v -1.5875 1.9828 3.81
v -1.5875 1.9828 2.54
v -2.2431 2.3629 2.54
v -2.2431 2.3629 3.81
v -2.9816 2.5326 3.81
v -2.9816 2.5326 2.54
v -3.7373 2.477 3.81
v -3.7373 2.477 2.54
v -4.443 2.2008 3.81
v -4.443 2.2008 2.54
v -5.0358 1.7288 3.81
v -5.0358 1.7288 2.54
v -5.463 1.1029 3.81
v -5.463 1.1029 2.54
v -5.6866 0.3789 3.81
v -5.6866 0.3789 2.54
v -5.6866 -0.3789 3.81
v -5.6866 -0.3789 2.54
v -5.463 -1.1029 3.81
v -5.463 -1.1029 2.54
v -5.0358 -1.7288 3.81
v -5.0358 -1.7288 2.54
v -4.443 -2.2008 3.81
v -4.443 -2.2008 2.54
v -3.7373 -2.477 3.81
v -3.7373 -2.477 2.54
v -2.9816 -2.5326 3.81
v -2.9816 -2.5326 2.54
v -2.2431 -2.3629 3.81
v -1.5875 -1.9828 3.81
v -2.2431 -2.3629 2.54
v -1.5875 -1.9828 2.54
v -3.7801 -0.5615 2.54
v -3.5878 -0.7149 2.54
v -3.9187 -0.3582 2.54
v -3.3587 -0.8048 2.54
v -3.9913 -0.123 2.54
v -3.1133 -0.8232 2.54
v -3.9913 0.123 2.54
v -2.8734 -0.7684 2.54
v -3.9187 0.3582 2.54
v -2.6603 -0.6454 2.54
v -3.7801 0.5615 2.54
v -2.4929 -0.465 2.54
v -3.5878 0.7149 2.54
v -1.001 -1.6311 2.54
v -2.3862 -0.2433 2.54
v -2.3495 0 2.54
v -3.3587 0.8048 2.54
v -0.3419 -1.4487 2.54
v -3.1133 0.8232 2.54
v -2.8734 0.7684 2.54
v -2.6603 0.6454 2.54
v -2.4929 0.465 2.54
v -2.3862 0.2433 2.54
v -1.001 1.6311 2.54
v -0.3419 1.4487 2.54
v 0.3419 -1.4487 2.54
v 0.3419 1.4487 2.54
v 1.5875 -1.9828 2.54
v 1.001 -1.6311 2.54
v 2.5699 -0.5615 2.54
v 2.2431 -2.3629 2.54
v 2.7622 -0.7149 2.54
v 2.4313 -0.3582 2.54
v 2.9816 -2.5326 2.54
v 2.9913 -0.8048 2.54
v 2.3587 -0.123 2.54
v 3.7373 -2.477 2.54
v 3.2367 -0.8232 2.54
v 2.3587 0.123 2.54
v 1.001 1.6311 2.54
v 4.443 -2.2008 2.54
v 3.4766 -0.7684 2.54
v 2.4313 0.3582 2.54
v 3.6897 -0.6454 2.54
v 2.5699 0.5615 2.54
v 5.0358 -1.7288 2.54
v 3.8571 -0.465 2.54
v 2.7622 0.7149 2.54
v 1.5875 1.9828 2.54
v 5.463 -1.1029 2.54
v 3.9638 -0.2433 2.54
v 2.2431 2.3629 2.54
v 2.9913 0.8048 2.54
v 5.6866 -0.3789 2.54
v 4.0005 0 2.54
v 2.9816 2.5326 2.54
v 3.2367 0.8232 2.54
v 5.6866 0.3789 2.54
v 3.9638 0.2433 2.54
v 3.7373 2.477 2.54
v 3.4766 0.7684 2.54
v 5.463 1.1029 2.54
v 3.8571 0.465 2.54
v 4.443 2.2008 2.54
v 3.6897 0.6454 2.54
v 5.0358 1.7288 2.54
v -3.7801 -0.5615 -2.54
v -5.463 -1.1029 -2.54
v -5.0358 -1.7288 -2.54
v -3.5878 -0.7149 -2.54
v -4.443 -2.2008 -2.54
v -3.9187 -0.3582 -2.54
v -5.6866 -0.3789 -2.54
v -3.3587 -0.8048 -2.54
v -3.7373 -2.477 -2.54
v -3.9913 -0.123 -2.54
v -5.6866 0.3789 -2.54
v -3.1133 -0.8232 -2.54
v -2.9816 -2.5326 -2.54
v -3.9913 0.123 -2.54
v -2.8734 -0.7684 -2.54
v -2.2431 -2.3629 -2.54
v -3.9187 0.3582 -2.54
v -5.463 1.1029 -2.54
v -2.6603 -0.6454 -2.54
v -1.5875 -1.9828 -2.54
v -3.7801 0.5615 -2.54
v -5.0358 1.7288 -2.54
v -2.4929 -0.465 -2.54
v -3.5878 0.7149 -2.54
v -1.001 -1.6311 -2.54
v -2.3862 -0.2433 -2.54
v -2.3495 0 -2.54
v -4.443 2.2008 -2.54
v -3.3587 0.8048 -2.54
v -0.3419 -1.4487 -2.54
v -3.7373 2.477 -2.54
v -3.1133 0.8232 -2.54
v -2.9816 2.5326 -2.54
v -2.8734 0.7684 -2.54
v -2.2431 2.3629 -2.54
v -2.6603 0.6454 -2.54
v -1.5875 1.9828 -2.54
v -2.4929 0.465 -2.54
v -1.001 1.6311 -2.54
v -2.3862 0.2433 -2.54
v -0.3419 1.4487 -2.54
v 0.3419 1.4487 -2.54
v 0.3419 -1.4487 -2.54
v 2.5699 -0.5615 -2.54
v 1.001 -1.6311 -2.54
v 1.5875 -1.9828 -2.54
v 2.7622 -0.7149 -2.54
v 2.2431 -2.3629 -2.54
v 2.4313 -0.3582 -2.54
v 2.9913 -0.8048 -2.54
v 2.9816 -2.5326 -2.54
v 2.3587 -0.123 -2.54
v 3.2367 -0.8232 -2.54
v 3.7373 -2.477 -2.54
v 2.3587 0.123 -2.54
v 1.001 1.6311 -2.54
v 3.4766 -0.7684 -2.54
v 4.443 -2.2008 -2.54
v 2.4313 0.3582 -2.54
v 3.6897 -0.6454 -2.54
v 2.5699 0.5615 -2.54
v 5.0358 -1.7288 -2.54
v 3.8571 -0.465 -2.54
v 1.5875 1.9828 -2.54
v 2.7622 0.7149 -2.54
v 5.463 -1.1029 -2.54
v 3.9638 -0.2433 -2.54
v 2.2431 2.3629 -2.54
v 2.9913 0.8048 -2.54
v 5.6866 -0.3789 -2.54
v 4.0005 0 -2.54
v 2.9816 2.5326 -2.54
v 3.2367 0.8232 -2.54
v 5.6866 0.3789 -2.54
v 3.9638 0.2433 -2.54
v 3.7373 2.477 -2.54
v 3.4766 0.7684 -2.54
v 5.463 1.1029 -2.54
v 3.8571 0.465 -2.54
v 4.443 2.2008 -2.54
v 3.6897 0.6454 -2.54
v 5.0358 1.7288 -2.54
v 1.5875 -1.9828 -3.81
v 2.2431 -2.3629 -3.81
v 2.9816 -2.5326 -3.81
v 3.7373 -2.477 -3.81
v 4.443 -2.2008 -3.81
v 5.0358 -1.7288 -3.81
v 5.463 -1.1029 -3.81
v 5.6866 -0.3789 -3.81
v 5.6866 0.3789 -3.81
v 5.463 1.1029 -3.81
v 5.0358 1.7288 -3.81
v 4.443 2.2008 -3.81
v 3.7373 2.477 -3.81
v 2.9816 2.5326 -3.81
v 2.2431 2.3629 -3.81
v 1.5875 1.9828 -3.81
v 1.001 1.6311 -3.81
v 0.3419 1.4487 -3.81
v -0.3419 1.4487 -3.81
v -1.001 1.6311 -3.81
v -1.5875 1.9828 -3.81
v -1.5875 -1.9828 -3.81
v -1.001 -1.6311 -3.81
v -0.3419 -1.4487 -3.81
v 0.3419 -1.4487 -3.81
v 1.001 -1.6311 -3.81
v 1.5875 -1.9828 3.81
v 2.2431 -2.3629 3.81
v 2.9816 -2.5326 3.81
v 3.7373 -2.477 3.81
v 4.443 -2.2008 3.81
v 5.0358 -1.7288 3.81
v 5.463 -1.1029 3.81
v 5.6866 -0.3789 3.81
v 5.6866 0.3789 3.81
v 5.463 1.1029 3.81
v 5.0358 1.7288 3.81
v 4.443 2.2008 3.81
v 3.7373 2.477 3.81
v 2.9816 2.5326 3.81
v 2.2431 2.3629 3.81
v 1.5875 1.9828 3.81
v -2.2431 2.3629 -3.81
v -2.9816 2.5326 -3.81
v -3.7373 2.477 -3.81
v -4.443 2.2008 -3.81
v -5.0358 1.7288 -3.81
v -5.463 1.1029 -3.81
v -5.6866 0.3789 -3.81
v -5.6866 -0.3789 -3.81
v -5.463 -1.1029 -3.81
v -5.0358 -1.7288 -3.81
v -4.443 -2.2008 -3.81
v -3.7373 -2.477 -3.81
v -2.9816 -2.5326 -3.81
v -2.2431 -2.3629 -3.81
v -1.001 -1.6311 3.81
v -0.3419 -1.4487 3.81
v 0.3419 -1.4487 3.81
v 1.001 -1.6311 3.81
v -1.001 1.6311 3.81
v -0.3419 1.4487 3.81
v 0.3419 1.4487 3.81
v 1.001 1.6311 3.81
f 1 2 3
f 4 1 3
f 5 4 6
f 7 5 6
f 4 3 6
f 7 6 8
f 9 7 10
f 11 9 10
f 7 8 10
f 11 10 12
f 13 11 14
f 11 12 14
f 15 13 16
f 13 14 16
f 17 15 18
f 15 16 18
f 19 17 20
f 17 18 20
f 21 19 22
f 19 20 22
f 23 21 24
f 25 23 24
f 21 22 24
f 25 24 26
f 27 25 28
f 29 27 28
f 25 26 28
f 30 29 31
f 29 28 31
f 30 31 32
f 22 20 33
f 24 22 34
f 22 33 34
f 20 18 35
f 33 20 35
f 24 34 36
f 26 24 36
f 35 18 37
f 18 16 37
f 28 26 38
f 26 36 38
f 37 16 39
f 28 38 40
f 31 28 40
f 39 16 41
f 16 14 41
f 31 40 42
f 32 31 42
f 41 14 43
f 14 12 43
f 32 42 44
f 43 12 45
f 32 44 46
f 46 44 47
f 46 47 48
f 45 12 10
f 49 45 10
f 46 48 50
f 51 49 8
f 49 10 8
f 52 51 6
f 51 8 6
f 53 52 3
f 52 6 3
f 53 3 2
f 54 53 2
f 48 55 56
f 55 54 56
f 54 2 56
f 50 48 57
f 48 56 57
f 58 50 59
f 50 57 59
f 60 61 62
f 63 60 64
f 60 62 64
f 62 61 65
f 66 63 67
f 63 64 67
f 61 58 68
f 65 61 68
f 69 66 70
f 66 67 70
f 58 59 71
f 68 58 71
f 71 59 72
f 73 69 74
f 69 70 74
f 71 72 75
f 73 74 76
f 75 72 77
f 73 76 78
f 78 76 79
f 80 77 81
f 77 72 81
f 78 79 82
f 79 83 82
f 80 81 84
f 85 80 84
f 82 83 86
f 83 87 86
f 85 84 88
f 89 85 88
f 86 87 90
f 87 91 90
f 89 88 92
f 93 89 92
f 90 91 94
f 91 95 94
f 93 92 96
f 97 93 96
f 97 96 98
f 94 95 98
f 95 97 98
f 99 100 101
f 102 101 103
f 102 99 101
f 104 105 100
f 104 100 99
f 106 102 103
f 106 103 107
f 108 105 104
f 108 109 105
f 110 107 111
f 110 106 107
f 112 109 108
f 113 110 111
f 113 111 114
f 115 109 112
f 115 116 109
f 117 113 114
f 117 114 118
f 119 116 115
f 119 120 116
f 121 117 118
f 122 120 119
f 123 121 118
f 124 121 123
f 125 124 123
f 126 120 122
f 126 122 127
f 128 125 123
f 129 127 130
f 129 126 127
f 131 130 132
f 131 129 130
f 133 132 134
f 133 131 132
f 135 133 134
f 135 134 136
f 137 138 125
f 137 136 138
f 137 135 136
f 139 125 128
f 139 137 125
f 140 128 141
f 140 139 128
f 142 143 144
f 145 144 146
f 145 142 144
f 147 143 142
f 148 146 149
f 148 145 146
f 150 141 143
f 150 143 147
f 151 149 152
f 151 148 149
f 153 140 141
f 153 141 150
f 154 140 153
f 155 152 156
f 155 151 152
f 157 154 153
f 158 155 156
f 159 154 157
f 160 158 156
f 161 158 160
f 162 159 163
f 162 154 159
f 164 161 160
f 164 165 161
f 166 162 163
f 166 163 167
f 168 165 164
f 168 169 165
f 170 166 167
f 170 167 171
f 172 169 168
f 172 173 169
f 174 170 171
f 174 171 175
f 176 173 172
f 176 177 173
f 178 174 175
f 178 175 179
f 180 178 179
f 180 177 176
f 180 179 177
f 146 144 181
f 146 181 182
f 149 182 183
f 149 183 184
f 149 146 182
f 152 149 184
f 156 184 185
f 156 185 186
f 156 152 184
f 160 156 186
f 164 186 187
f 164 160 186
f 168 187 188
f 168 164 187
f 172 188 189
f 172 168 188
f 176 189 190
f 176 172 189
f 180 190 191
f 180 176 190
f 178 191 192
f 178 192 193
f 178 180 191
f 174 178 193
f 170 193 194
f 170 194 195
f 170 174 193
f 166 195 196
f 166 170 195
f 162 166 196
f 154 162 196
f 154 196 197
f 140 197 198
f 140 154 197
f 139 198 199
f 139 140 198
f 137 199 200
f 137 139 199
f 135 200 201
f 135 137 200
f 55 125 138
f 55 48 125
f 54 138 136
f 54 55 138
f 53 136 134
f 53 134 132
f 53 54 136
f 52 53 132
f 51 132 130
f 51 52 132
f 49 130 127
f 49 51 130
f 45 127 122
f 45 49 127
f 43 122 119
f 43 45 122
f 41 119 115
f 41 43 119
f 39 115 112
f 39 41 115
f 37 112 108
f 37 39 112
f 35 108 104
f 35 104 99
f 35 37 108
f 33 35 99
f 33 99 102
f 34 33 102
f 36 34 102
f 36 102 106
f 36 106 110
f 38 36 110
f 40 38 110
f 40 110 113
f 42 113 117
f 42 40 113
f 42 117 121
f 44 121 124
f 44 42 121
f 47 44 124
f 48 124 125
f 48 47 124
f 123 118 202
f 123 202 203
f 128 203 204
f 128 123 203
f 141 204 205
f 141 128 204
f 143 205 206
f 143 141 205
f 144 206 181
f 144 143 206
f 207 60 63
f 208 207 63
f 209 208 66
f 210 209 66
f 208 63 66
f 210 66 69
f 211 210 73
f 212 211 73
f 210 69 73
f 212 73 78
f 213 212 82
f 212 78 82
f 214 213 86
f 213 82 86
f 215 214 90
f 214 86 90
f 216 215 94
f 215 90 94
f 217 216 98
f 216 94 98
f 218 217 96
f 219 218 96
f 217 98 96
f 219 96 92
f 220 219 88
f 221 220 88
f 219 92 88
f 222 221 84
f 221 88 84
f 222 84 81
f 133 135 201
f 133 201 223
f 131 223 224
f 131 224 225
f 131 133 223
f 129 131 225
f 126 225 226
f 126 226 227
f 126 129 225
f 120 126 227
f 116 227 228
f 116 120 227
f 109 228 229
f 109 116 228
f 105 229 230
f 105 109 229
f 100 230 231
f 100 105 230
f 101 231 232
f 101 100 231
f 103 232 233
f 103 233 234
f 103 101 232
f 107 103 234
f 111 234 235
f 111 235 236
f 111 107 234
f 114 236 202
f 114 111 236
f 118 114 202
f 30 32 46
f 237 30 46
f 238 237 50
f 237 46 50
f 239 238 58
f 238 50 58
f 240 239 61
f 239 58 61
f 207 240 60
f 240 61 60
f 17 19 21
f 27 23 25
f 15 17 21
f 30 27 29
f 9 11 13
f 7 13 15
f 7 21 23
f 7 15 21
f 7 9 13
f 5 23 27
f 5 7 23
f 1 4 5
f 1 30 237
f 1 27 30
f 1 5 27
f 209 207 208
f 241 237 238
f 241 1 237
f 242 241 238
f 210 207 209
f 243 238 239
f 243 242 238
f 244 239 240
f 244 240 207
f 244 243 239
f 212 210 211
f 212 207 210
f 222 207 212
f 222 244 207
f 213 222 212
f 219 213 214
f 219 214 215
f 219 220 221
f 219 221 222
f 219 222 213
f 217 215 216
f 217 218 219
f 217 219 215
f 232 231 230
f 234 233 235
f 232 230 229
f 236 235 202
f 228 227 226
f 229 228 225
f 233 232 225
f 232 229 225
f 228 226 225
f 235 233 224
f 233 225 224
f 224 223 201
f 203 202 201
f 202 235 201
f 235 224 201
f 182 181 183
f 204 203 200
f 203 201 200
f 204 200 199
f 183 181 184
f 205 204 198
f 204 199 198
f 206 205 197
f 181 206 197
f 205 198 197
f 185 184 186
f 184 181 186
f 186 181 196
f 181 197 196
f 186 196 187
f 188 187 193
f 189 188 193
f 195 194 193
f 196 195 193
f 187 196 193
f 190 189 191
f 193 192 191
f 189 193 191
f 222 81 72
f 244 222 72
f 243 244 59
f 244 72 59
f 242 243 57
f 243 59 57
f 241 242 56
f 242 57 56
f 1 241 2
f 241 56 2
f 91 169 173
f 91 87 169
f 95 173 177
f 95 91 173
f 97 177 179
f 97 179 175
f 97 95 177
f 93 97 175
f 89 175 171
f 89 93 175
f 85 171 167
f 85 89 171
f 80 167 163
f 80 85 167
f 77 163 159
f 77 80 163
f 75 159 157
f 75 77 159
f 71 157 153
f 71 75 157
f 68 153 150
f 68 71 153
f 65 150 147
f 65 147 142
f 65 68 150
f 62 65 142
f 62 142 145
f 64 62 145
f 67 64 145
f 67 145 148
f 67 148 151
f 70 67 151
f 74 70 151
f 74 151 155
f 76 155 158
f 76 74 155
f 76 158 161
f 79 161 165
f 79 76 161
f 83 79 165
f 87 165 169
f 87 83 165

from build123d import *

# Parameters (mm, degrees)
SKETCH1_R             = 0.8255
BOSS_EXTRUDE1_DEPTH   = 2.54
BOSS_EXTRUDE1_2_DEPTH = 2.54
BOSS_EXTRUDE2_DEPTH   = 1.27


with BuildPart() as part:
    # Sketch1 → Boss-Extrude1 (new, symmetric)
    with BuildSketch(Plane.XY):
        with Locations((3.175, 0)):
            Circle(SKETCH1_R)
    extrude(amount=BOSS_EXTRUDE1_DEPTH, both=True)



with BuildPart() as body_2:
    # Sketch1 → Boss-Extrude1 2 (new, symmetric)
    with BuildSketch(Plane.XY):
        with Locations((-3.175, 0)):
            Circle(SKETCH1_R)
    extrude(amount=BOSS_EXTRUDE1_2_DEPTH, both=True)


with BuildPart() as part_1:
    add(part.part)

    add(body_2.part)  # Boss-Extrude2 merges body 2
    # Sketch2 → Boss-Extrude2 (add)
    with BuildSketch(Plane.XY.offset(2.54)):
        with BuildLine():
            ThreePointArc((1.5875, -1.982786864), (5.715, 0), (1.5875, 1.982786864))
            ThreePointArc((1.5875, 1.982786864), (0, 1.425573729), (-1.5875, 1.982786864))
            ThreePointArc((-1.5875, 1.982786864), (-5.715, 0), (-1.5875, -1.982786864))
            ThreePointArc((-1.5875, -1.982786864), (0, -1.425573729), (1.5875, -1.982786864))
        make_face()
    boss_extrude2 = extrude(amount=BOSS_EXTRUDE2_DEPTH)

    # Mirror1: Boss-Extrude2 across plane
    add(boss_extrude2.mirror(Plane.XY))


solid = part_1.part
